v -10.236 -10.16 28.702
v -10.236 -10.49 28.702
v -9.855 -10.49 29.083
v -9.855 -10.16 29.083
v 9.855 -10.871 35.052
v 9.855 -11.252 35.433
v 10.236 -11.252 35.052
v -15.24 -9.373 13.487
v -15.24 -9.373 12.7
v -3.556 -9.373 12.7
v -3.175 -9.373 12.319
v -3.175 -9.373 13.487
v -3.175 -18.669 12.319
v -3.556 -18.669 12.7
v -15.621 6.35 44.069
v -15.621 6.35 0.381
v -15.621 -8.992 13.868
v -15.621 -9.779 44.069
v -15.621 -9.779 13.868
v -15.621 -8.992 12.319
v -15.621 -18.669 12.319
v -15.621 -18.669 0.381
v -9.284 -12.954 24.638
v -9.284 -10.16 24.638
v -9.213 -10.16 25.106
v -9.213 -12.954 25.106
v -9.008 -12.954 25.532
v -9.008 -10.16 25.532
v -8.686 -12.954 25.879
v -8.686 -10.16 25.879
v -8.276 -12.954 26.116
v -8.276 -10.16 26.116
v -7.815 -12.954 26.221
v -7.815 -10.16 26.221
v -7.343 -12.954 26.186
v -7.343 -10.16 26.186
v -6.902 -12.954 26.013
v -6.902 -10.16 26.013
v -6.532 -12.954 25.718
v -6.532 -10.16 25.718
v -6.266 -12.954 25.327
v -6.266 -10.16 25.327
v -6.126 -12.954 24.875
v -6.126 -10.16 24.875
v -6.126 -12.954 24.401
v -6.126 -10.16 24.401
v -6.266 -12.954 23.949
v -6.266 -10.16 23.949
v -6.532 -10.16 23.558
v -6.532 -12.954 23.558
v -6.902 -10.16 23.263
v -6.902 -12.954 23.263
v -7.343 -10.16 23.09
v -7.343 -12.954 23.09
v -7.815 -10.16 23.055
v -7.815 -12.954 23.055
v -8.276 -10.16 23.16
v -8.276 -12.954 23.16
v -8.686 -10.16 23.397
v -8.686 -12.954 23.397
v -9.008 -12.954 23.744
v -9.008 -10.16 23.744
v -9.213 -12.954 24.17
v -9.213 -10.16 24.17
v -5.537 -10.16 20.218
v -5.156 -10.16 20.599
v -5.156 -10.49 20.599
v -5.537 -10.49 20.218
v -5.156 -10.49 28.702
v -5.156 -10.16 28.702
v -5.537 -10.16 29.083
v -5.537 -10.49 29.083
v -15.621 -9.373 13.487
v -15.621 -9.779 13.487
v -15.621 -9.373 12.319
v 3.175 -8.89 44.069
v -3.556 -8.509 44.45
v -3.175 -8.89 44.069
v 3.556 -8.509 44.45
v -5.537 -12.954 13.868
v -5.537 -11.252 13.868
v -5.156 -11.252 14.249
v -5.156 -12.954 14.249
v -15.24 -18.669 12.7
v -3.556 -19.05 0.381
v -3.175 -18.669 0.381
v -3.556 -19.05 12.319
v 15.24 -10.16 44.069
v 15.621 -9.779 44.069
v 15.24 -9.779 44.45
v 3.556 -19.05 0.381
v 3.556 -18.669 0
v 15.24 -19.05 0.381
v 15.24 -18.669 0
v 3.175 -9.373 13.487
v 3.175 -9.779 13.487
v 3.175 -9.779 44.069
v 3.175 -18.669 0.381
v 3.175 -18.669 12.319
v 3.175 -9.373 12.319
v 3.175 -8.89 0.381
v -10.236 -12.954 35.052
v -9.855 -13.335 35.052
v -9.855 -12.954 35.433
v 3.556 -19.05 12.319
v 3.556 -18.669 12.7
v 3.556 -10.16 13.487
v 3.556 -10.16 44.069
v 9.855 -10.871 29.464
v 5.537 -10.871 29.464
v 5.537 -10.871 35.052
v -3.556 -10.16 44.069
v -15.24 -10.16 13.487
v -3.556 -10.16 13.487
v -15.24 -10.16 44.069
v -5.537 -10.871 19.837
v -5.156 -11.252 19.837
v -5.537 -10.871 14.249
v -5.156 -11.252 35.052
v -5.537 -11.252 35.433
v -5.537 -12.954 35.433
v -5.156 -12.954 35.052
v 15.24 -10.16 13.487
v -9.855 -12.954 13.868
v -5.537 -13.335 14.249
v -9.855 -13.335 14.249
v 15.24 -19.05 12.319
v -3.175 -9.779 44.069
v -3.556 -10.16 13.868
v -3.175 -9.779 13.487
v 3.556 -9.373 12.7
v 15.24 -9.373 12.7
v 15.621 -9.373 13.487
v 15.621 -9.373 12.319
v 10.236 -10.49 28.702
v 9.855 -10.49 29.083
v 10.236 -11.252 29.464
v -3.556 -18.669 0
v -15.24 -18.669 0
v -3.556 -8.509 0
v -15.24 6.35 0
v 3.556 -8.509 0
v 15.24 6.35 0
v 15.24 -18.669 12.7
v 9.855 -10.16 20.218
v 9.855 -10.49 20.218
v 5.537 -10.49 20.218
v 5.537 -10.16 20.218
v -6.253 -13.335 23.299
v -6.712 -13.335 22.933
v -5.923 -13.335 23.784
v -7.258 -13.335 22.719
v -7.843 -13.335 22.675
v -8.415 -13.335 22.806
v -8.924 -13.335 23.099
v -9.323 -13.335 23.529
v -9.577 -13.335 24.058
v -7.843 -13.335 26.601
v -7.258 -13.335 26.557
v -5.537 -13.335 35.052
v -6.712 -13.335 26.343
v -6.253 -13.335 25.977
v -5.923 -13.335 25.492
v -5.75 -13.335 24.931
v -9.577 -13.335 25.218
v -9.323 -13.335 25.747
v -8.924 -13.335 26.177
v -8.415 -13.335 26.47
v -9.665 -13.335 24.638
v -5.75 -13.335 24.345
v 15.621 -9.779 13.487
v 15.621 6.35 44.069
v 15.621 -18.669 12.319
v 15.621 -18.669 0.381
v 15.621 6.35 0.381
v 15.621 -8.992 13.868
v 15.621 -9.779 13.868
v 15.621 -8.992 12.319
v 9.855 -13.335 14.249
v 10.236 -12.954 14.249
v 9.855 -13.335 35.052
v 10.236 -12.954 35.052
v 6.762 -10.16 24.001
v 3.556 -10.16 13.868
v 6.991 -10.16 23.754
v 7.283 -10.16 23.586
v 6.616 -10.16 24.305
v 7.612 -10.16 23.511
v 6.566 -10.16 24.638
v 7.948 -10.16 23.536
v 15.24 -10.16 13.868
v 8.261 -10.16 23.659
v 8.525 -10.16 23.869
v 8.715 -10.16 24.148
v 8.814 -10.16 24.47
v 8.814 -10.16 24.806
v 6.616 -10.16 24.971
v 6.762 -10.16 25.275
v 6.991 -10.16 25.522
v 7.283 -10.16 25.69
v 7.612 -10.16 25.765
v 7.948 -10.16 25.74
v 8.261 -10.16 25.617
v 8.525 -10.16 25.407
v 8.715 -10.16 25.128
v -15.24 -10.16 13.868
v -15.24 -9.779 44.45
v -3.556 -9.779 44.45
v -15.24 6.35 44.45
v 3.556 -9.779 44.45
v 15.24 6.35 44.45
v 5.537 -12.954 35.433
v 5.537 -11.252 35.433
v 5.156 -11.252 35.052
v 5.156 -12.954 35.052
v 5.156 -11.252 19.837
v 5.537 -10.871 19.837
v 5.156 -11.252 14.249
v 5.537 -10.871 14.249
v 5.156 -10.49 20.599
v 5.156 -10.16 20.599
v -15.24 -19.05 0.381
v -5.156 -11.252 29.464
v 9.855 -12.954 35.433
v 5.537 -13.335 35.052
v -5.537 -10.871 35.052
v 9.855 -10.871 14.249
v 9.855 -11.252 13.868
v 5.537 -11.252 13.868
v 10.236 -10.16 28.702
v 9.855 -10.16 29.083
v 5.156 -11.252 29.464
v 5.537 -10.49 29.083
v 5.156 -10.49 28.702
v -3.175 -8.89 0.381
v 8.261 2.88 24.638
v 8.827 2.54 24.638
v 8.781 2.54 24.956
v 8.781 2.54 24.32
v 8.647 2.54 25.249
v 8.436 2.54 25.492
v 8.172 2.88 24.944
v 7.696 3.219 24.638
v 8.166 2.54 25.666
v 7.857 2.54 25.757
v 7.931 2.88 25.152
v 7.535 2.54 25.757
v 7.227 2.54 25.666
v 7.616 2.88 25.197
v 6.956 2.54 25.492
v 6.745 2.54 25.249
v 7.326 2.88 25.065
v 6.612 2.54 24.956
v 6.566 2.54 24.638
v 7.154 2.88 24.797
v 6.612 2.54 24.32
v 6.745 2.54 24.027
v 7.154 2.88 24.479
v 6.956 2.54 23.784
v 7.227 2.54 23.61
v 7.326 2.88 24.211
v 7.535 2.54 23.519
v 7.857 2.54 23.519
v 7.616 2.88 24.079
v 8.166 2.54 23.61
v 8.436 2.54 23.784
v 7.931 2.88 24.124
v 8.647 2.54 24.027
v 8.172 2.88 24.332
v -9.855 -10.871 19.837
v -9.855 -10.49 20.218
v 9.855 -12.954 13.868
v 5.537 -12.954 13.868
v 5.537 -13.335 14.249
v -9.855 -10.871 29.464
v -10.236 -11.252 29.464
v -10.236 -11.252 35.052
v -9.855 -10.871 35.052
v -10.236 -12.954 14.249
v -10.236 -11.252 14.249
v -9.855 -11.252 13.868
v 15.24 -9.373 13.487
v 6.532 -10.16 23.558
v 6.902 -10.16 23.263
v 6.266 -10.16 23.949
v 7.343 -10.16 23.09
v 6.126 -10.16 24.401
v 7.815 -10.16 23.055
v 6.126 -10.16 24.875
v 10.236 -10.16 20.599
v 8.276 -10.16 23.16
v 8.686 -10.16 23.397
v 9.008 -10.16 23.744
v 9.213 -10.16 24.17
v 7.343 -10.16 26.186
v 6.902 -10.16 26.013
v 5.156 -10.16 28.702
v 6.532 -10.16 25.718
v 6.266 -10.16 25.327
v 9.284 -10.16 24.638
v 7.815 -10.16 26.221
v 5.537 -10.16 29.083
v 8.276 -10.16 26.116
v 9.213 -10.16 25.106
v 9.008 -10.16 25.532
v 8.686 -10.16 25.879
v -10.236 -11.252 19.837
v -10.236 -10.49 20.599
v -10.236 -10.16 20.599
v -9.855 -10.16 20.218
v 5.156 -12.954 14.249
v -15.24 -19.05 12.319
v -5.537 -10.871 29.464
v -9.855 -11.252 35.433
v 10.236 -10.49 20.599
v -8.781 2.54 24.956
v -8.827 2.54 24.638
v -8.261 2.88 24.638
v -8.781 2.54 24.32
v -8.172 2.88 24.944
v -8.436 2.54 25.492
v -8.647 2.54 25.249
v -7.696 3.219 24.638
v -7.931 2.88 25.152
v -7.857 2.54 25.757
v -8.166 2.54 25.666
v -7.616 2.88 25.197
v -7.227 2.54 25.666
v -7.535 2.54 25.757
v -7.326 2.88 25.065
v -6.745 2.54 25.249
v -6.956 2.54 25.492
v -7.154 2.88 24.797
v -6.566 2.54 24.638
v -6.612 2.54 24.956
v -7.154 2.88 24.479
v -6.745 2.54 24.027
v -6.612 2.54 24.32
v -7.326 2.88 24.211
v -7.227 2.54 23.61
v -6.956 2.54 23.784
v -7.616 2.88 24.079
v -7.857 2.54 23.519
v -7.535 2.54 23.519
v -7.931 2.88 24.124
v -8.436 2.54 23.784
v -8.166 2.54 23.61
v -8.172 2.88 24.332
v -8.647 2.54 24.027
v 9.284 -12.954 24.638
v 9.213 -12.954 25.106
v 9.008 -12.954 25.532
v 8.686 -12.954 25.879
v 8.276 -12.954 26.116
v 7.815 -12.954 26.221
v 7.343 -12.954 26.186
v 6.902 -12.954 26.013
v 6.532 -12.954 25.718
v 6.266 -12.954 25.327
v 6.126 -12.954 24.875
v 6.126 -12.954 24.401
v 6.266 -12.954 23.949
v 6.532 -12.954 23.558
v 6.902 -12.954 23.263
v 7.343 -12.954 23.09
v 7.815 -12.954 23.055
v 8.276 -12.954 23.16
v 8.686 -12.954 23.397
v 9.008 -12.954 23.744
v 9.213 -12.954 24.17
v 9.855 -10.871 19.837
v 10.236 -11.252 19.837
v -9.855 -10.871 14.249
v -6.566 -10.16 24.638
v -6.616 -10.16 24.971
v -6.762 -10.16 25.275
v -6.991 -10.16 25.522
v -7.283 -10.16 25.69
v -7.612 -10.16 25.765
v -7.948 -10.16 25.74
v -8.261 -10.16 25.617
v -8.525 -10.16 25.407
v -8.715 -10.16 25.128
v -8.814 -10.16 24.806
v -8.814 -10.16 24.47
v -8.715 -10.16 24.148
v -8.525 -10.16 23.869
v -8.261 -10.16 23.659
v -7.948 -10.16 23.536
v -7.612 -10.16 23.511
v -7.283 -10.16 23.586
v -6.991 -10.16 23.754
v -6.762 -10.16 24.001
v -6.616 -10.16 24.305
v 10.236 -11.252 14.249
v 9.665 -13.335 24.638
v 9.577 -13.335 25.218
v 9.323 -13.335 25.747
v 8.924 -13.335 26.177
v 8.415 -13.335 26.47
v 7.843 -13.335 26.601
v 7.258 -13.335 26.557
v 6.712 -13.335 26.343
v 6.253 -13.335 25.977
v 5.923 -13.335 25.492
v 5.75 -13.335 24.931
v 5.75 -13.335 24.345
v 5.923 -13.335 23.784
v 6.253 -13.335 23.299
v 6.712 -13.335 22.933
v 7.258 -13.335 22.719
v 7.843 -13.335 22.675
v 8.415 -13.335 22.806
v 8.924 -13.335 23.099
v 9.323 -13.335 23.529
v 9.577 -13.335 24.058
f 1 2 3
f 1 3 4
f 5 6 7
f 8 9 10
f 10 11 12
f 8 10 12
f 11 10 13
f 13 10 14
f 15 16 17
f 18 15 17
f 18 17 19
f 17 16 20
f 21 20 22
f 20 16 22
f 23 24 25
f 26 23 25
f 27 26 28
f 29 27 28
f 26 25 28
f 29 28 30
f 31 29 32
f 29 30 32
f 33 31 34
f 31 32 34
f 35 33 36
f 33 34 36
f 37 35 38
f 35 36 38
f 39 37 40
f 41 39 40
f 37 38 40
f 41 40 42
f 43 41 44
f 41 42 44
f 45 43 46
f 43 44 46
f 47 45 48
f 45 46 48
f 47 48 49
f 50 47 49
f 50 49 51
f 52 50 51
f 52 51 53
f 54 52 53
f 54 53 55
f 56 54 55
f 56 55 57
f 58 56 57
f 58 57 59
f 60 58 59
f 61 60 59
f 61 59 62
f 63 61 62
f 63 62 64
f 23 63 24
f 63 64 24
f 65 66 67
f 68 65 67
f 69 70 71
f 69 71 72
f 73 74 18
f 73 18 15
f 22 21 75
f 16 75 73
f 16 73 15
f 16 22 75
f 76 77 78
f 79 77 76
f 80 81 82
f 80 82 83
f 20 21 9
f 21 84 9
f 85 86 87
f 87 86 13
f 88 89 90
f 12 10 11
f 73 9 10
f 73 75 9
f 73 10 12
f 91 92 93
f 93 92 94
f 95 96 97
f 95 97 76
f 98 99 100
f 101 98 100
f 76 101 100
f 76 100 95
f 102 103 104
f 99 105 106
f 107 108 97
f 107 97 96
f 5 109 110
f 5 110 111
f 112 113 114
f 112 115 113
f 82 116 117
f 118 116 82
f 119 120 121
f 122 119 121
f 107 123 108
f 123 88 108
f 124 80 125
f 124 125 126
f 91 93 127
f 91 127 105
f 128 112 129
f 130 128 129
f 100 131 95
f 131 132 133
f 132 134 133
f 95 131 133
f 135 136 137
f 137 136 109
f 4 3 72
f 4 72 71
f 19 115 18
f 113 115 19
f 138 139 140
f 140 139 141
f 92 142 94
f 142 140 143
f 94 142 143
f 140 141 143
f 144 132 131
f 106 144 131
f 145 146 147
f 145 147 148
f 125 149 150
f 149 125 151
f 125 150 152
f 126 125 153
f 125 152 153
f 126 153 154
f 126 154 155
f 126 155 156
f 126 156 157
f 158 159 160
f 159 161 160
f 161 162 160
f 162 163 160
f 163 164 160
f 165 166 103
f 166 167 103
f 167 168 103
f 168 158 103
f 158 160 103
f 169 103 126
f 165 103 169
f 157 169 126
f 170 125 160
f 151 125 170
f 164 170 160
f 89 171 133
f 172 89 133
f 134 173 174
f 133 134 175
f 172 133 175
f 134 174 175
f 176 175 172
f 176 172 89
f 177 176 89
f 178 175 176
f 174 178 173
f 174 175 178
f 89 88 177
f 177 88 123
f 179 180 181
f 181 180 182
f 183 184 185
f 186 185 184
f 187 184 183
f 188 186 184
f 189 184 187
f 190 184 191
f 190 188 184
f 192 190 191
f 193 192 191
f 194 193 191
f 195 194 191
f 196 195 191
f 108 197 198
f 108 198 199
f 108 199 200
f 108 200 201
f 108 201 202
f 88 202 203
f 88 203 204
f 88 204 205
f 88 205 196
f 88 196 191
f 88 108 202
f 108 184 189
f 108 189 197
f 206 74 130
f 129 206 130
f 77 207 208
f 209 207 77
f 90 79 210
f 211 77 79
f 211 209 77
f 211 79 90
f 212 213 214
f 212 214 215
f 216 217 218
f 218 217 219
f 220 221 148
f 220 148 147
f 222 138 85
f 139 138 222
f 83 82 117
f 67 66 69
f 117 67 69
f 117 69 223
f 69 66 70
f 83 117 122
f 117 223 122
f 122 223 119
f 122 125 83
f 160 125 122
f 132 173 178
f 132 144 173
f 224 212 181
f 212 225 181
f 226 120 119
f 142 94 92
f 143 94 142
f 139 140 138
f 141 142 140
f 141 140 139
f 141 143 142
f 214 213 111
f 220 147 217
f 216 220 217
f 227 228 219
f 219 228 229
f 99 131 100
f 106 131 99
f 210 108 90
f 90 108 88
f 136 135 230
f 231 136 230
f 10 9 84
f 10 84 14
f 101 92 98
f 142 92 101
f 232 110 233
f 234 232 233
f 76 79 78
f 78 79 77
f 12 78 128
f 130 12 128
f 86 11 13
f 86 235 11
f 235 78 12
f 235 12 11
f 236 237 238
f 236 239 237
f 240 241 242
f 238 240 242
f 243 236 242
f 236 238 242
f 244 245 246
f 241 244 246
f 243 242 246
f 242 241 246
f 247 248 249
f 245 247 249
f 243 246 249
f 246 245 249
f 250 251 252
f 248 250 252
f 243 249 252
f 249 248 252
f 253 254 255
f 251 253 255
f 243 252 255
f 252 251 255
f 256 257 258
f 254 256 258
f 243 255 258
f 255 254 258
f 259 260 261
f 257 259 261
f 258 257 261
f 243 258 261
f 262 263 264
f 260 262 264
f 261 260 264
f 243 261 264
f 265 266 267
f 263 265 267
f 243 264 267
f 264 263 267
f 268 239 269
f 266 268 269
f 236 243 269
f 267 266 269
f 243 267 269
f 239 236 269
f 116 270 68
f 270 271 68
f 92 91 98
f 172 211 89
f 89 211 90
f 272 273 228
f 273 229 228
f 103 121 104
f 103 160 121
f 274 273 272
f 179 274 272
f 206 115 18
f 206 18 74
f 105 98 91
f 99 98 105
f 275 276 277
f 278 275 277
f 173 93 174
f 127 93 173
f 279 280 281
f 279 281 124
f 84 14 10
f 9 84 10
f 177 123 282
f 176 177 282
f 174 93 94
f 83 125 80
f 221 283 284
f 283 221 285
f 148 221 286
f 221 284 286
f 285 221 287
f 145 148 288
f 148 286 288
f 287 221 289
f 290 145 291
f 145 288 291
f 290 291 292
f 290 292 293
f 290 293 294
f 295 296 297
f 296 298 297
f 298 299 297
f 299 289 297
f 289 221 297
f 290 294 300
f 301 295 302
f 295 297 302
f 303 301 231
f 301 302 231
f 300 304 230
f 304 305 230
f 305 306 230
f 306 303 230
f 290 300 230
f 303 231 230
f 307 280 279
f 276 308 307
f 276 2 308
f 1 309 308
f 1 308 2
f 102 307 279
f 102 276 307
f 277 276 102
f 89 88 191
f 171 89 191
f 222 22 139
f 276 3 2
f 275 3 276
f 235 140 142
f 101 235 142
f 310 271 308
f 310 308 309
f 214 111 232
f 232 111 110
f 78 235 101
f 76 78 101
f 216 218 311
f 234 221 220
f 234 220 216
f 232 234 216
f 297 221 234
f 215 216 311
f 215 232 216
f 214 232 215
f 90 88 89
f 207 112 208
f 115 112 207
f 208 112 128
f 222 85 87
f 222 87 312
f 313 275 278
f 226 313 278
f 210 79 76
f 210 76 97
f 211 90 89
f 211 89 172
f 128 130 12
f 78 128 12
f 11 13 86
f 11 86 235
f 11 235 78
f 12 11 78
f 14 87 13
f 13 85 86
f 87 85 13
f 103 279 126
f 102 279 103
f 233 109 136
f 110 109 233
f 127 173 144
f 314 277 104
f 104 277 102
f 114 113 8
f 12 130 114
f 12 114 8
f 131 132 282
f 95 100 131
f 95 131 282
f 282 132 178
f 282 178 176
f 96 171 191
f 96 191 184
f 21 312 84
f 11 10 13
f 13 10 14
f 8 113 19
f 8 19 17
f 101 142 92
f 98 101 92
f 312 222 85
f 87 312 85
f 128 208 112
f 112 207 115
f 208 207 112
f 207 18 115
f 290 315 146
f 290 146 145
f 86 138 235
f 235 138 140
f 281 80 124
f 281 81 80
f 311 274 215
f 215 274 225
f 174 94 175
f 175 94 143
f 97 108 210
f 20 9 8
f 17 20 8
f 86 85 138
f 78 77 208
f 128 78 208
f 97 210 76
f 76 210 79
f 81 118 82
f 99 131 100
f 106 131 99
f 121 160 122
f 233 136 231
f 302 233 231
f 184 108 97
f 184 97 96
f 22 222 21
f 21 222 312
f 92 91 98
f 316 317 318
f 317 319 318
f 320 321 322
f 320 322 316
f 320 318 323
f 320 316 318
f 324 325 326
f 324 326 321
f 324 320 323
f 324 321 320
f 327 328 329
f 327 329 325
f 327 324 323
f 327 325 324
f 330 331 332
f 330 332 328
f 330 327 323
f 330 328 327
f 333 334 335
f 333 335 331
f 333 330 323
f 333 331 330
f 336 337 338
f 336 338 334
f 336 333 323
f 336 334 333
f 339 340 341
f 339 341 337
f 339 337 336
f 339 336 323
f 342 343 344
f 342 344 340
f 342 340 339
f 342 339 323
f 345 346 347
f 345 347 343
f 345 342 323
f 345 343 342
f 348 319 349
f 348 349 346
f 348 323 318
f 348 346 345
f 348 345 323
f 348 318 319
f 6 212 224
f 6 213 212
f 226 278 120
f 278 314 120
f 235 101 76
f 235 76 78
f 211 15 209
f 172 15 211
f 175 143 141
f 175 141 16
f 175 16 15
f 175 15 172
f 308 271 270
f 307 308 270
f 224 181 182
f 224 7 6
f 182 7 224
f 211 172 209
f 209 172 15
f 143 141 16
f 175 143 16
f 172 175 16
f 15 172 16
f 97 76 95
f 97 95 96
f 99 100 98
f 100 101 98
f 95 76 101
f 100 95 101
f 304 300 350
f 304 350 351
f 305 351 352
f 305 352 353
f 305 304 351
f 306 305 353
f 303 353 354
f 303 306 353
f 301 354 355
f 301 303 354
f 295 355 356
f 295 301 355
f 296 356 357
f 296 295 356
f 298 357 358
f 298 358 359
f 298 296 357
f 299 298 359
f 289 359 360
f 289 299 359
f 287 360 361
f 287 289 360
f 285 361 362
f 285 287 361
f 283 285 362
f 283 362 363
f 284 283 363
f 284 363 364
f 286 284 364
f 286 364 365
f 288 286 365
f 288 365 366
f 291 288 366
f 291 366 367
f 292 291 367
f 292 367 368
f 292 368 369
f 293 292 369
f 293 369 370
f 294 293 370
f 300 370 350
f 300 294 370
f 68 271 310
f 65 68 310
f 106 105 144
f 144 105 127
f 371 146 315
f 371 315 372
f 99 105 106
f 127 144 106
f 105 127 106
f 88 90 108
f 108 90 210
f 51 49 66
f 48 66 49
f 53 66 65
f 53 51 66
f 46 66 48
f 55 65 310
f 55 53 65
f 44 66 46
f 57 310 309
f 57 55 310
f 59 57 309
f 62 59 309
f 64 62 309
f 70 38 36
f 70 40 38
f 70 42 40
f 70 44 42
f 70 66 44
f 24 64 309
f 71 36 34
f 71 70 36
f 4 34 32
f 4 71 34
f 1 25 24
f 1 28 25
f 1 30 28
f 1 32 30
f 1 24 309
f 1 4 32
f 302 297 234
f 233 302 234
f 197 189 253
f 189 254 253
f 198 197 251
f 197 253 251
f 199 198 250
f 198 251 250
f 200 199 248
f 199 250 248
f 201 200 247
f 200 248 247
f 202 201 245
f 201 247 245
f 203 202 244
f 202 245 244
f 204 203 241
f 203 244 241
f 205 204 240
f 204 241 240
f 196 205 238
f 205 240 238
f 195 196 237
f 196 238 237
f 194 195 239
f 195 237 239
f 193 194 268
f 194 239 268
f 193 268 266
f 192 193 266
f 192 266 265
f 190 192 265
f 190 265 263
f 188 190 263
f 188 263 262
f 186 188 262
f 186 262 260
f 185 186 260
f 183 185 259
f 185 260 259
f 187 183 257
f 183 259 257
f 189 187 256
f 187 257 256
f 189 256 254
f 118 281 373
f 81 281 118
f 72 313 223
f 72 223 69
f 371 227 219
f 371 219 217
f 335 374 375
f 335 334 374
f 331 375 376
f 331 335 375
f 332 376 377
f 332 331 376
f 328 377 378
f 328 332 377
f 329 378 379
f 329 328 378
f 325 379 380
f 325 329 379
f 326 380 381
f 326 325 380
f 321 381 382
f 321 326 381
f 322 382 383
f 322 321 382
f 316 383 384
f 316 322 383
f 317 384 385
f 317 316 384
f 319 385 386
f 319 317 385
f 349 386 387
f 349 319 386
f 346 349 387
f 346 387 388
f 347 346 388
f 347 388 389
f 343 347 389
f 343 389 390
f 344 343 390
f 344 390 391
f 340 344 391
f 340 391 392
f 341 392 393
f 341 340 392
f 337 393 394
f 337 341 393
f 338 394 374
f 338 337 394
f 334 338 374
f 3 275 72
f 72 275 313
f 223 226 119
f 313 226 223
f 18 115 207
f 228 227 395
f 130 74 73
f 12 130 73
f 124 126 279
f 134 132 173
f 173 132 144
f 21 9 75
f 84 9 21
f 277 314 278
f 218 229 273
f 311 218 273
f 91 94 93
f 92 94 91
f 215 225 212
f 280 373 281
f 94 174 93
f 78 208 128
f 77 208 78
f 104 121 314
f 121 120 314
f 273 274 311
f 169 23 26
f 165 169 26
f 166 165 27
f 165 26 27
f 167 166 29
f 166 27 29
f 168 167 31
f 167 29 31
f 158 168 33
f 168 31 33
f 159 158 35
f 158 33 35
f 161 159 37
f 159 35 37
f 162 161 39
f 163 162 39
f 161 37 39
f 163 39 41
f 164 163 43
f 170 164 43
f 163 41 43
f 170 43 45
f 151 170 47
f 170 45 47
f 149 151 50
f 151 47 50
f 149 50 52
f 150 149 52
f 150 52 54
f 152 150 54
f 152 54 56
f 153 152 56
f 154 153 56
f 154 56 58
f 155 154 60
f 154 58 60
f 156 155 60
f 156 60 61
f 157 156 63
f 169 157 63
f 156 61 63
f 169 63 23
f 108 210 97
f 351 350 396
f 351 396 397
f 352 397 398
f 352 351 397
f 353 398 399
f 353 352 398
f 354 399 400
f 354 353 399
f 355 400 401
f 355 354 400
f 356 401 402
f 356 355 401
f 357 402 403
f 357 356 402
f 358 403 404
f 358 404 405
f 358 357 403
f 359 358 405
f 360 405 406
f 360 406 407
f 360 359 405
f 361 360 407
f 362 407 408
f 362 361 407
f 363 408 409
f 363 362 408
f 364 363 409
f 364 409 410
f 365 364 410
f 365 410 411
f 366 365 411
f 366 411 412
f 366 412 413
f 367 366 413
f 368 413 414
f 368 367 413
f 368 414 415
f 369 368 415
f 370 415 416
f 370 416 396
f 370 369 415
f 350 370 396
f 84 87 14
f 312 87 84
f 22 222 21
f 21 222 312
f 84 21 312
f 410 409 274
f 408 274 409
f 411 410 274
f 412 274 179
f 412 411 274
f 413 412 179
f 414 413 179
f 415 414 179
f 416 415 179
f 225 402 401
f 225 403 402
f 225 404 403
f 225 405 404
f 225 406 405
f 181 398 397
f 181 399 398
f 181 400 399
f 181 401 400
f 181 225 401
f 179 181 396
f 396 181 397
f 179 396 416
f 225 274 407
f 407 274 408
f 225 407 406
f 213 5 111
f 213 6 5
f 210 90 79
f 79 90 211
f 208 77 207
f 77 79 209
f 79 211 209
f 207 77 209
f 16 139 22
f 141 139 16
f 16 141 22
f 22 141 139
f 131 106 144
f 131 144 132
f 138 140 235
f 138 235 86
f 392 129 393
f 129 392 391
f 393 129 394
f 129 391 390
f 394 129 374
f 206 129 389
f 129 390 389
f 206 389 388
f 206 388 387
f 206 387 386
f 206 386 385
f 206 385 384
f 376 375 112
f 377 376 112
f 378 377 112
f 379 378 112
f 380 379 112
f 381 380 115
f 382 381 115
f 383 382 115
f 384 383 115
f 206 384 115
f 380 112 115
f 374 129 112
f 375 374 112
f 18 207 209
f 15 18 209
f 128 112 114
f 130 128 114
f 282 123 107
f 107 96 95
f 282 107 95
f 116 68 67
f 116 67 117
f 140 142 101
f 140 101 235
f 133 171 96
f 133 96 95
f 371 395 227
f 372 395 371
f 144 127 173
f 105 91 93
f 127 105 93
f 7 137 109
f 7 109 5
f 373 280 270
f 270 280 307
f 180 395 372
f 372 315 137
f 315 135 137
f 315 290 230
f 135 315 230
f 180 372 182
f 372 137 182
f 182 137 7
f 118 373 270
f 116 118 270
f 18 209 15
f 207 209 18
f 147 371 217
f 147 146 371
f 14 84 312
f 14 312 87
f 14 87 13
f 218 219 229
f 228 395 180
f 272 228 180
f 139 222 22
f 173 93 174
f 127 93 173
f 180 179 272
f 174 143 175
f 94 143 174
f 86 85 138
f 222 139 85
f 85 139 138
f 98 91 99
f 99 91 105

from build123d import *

# Parameters (mm, degrees)
F1_DEPTH  = 44.45
F2_W      = 12.446
F2_H      = 8.89
F3_DEPTH  = 31.75
F4_W      = 0.7874
F4_H      = 0.7874
F5_DEPTH  = 31.243
F6_SIZE   = 0.381
F8_D      = 2.2606
F8_DEPTH  = 12.7
F8_TIP    = 0.6791527577
F9_W      = 5.08
F9_H      = 21.5646
F9_R      = 1.5875
F10_DEPTH = 3.175
F11_W     = 0.7112
F11_H     = 6.35
F12_DEPTH = 25.8582
F13_SIZE  = 0.381
F14_W     = 42.4513401179
F14_H     = 23.650664404
F15_DEPTH = 44.451


with BuildPart() as f1:
    # F0 (on Top) → F1 (new body)
    with BuildSketch(Plane.XY):
        Polygon((15.621, -19.05), (15.621, 19.05), (3.175, 19.05), (3.175, 8.89), (-3.175, 8.89), (-3.175, 19.05), (-15.621, 19.05), (-15.621, -19.05), (-3.175, -19.05), (-3.175, -8.89), (3.175, -8.89), (3.175, -19.05), align=None)
    extrude(amount=F1_DEPTH)

    # F2 (on face) → F3 (cut)
    with BuildSketch(Plane.XY.offset(44.45)):
        with Locations((-9.398, -14.605)):
            Rectangle(F2_W, F2_H)
        with Locations((9.398, -14.605)):
            Rectangle(F2_W, F2_H)
        with Locations((9.398, 14.605)):
            Rectangle(F2_W, F2_H)
        with Locations((-9.398, 14.605)):
            Rectangle(F2_W, F2_H)
    extrude(amount=-F3_DEPTH, mode=Mode.SUBTRACT)

    # F4 (on face) → F5 (cut, through all)
    with BuildSketch(Plane.YZ.offset(15.621)):
        with Locations((-9.7663, 13.0937)):
            Rectangle(F4_W, F4_H)
        with Locations((9.7663, 13.0937)):
            Rectangle(F4_W, F4_H)
    extrude(amount=-F5_DEPTH, mode=Mode.SUBTRACT)

    # F6
    f6_edges = [f1.edges().sort_by_distance(p)[0] for p in [
        (9.398, 10.16, 44.45),
        (15.621, 10.16, 28.9687),
        (9.398, 10.16, 13.4874),
        (3.175, 10.16, 28.9687),
        (-9.398, 10.16, 44.45),
        (-3.175, 10.16, 28.9687),
        (-9.398, 10.16, 13.4874),
        (-15.621, 10.16, 28.9687),
        (-9.398, 19.05, 0),
        (-15.621, 19.05, 6.35),
        (-9.398, 19.05, 12.7),
        (-3.175, 19.05, 6.35),
        (9.398, 19.05, 0),
        (3.175, 19.05, 6.35),
        (9.398, 19.05, 12.7),
        (15.621, 19.05, 6.35),
        (-15.621, 0, 0),
        (-15.621, 14.2113, 12.7),
        (-15.621, 9.3726, 13.0937),
        (-15.621, 9.7663, 13.4874),
        (-15.621, 0, 44.45),
        (-15.621, -10.16, 28.9687),
        (-15.621, -9.7663, 13.4874),
        (-15.621, -9.3726, 13.0937),
        (-15.621, -14.2113, 12.7),
        (-15.621, -19.05, 6.35),
        (9.398, -10.16, 44.45),
        (3.175, -10.16, 28.9687),
        (9.398, -10.16, 13.4874),
        (15.621, -10.16, 28.9687),
        (9.398, -19.05, 0),
        (15.621, -19.05, 6.35),
        (9.398, -19.05, 12.7),
        (3.175, -19.05, 6.35),
        (-9.398, -19.05, 0),
        (-3.175, -19.05, 6.35),
        (-9.398, -19.05, 12.7),
        (15.621, 0, 0),
        (3.175, 13.97, 0),
        (0, 8.89, 0),
        (-3.175, 13.97, 0),
        (-3.175, -13.97, 0),
        (0, -8.89, 0),
        (3.175, -13.97, 0),
        (3.175, -9.525, 44.45),
        (0, -8.89, 44.45),
        (-3.175, -9.525, 44.45),
        (-9.398, -10.16, 44.45),
        (-3.175, 9.525, 44.45),
        (0, 8.89, 44.45),
        (3.175, 9.525, 44.45),
        (15.621, 0, 44.45),
        (-3.175, -14.2113, 12.7),
        (3.175, -14.2113, 12.7),
        (3.175, 14.2113, 12.7),
        (-3.175, 14.2113, 12.7),
        (15.621, -14.2113, 12.7),
        (-3.175, -10.16, 28.9687),
        (15.621, 14.2113, 12.7),
    ]]
    chamfer(f6_edges, length=F6_SIZE)

    # F8
    with Locations(Plane.XZ.offset(10.16)):
        with Locations((7.6962, 24.638)):
            Hole(F8_D / 2, depth=F8_DEPTH)
            with Locations((0, 0, -(F8_DEPTH + F8_TIP / 2))):  # 118° drill point
                Cone(0, F8_D / 2, F8_TIP, mode=Mode.SUBTRACT)

    # F14 (on face) → F15 (cut, through all)
    with BuildSketch(Plane(origin=(0, 0, 0), x_dir=(1, 0, 0), z_dir=(0, 0, -1))):
        with Locations((-0.5870210007, -18.175332202)):
            Rectangle(F14_W, F14_H)
    extrude(amount=-F15_DEPTH, mode=Mode.SUBTRACT)


with BuildPart() as f10:
    # F9 (on face) → F10 (new body)
    with BuildSketch(Plane.XZ.offset(10.16)):
        with Locations((7.6962, 24.6507)):
            Rectangle(F9_W, F9_H)
        with Locations((7.6962, 24.638)):
            Circle(F9_R, mode=Mode.SUBTRACT)
    extrude(amount=F10_DEPTH)

    # F11 (on face) → F12 (cut, through all)
    with BuildSketch(Plane.YZ.offset(10.2362)):
        with Locations((-10.5156, 17.0434)):
            Rectangle(F11_W, F11_H)
        with Locations((-10.5156, 32.258)):
            Rectangle(F11_W, F11_H)
    extrude(amount=-F12_DEPTH, mode=Mode.SUBTRACT)

    # F13
    f13_edges = [f10.edges().sort_by_distance(p)[0] for p in [
        (10.2362, -13.335, 24.6507),
        (7.6962, -13.335, 35.433),
        (5.1562, -13.335, 24.6507),
        (7.6962, -13.335, 13.8684),
        (6.1087, -13.335, 24.638),
        (7.6962, -10.8712, 35.433),
        (5.1562, -12.1031, 35.433),
        (10.2362, -12.1031, 35.433),
        (10.2362, -10.8712, 17.0434),
        (7.6962, -10.8712, 13.8684),
        (5.1562, -10.8712, 17.0434),
        (7.6962, -10.8712, 20.2184),
        (10.2362, -10.8712, 32.258),
        (7.6962, -10.8712, 29.083),
        (5.1562, -10.8712, 32.258),
        (10.2362, -10.5156, 20.2184),
        (10.2362, -10.5156, 29.083),
        (10.2362, -12.1031, 13.8684),
        (5.1562, -10.5156, 20.2184),
        (5.1562, -10.5156, 29.083),
        (5.1562, -12.1031, 13.8684),
    ]]
    chamfer(f13_edges, length=F13_SIZE)


with BuildPart() as f16_1:
    # F16: instance of F10
    add(f10.part.mirror(Plane.YZ))


with BuildPart() as f16_2:
    # F16: instance of F1
    add(f1.part.mirror(Plane.YZ))


solid = Compound([f1.part, f10.part, f16_1.part, f16_2.part])
